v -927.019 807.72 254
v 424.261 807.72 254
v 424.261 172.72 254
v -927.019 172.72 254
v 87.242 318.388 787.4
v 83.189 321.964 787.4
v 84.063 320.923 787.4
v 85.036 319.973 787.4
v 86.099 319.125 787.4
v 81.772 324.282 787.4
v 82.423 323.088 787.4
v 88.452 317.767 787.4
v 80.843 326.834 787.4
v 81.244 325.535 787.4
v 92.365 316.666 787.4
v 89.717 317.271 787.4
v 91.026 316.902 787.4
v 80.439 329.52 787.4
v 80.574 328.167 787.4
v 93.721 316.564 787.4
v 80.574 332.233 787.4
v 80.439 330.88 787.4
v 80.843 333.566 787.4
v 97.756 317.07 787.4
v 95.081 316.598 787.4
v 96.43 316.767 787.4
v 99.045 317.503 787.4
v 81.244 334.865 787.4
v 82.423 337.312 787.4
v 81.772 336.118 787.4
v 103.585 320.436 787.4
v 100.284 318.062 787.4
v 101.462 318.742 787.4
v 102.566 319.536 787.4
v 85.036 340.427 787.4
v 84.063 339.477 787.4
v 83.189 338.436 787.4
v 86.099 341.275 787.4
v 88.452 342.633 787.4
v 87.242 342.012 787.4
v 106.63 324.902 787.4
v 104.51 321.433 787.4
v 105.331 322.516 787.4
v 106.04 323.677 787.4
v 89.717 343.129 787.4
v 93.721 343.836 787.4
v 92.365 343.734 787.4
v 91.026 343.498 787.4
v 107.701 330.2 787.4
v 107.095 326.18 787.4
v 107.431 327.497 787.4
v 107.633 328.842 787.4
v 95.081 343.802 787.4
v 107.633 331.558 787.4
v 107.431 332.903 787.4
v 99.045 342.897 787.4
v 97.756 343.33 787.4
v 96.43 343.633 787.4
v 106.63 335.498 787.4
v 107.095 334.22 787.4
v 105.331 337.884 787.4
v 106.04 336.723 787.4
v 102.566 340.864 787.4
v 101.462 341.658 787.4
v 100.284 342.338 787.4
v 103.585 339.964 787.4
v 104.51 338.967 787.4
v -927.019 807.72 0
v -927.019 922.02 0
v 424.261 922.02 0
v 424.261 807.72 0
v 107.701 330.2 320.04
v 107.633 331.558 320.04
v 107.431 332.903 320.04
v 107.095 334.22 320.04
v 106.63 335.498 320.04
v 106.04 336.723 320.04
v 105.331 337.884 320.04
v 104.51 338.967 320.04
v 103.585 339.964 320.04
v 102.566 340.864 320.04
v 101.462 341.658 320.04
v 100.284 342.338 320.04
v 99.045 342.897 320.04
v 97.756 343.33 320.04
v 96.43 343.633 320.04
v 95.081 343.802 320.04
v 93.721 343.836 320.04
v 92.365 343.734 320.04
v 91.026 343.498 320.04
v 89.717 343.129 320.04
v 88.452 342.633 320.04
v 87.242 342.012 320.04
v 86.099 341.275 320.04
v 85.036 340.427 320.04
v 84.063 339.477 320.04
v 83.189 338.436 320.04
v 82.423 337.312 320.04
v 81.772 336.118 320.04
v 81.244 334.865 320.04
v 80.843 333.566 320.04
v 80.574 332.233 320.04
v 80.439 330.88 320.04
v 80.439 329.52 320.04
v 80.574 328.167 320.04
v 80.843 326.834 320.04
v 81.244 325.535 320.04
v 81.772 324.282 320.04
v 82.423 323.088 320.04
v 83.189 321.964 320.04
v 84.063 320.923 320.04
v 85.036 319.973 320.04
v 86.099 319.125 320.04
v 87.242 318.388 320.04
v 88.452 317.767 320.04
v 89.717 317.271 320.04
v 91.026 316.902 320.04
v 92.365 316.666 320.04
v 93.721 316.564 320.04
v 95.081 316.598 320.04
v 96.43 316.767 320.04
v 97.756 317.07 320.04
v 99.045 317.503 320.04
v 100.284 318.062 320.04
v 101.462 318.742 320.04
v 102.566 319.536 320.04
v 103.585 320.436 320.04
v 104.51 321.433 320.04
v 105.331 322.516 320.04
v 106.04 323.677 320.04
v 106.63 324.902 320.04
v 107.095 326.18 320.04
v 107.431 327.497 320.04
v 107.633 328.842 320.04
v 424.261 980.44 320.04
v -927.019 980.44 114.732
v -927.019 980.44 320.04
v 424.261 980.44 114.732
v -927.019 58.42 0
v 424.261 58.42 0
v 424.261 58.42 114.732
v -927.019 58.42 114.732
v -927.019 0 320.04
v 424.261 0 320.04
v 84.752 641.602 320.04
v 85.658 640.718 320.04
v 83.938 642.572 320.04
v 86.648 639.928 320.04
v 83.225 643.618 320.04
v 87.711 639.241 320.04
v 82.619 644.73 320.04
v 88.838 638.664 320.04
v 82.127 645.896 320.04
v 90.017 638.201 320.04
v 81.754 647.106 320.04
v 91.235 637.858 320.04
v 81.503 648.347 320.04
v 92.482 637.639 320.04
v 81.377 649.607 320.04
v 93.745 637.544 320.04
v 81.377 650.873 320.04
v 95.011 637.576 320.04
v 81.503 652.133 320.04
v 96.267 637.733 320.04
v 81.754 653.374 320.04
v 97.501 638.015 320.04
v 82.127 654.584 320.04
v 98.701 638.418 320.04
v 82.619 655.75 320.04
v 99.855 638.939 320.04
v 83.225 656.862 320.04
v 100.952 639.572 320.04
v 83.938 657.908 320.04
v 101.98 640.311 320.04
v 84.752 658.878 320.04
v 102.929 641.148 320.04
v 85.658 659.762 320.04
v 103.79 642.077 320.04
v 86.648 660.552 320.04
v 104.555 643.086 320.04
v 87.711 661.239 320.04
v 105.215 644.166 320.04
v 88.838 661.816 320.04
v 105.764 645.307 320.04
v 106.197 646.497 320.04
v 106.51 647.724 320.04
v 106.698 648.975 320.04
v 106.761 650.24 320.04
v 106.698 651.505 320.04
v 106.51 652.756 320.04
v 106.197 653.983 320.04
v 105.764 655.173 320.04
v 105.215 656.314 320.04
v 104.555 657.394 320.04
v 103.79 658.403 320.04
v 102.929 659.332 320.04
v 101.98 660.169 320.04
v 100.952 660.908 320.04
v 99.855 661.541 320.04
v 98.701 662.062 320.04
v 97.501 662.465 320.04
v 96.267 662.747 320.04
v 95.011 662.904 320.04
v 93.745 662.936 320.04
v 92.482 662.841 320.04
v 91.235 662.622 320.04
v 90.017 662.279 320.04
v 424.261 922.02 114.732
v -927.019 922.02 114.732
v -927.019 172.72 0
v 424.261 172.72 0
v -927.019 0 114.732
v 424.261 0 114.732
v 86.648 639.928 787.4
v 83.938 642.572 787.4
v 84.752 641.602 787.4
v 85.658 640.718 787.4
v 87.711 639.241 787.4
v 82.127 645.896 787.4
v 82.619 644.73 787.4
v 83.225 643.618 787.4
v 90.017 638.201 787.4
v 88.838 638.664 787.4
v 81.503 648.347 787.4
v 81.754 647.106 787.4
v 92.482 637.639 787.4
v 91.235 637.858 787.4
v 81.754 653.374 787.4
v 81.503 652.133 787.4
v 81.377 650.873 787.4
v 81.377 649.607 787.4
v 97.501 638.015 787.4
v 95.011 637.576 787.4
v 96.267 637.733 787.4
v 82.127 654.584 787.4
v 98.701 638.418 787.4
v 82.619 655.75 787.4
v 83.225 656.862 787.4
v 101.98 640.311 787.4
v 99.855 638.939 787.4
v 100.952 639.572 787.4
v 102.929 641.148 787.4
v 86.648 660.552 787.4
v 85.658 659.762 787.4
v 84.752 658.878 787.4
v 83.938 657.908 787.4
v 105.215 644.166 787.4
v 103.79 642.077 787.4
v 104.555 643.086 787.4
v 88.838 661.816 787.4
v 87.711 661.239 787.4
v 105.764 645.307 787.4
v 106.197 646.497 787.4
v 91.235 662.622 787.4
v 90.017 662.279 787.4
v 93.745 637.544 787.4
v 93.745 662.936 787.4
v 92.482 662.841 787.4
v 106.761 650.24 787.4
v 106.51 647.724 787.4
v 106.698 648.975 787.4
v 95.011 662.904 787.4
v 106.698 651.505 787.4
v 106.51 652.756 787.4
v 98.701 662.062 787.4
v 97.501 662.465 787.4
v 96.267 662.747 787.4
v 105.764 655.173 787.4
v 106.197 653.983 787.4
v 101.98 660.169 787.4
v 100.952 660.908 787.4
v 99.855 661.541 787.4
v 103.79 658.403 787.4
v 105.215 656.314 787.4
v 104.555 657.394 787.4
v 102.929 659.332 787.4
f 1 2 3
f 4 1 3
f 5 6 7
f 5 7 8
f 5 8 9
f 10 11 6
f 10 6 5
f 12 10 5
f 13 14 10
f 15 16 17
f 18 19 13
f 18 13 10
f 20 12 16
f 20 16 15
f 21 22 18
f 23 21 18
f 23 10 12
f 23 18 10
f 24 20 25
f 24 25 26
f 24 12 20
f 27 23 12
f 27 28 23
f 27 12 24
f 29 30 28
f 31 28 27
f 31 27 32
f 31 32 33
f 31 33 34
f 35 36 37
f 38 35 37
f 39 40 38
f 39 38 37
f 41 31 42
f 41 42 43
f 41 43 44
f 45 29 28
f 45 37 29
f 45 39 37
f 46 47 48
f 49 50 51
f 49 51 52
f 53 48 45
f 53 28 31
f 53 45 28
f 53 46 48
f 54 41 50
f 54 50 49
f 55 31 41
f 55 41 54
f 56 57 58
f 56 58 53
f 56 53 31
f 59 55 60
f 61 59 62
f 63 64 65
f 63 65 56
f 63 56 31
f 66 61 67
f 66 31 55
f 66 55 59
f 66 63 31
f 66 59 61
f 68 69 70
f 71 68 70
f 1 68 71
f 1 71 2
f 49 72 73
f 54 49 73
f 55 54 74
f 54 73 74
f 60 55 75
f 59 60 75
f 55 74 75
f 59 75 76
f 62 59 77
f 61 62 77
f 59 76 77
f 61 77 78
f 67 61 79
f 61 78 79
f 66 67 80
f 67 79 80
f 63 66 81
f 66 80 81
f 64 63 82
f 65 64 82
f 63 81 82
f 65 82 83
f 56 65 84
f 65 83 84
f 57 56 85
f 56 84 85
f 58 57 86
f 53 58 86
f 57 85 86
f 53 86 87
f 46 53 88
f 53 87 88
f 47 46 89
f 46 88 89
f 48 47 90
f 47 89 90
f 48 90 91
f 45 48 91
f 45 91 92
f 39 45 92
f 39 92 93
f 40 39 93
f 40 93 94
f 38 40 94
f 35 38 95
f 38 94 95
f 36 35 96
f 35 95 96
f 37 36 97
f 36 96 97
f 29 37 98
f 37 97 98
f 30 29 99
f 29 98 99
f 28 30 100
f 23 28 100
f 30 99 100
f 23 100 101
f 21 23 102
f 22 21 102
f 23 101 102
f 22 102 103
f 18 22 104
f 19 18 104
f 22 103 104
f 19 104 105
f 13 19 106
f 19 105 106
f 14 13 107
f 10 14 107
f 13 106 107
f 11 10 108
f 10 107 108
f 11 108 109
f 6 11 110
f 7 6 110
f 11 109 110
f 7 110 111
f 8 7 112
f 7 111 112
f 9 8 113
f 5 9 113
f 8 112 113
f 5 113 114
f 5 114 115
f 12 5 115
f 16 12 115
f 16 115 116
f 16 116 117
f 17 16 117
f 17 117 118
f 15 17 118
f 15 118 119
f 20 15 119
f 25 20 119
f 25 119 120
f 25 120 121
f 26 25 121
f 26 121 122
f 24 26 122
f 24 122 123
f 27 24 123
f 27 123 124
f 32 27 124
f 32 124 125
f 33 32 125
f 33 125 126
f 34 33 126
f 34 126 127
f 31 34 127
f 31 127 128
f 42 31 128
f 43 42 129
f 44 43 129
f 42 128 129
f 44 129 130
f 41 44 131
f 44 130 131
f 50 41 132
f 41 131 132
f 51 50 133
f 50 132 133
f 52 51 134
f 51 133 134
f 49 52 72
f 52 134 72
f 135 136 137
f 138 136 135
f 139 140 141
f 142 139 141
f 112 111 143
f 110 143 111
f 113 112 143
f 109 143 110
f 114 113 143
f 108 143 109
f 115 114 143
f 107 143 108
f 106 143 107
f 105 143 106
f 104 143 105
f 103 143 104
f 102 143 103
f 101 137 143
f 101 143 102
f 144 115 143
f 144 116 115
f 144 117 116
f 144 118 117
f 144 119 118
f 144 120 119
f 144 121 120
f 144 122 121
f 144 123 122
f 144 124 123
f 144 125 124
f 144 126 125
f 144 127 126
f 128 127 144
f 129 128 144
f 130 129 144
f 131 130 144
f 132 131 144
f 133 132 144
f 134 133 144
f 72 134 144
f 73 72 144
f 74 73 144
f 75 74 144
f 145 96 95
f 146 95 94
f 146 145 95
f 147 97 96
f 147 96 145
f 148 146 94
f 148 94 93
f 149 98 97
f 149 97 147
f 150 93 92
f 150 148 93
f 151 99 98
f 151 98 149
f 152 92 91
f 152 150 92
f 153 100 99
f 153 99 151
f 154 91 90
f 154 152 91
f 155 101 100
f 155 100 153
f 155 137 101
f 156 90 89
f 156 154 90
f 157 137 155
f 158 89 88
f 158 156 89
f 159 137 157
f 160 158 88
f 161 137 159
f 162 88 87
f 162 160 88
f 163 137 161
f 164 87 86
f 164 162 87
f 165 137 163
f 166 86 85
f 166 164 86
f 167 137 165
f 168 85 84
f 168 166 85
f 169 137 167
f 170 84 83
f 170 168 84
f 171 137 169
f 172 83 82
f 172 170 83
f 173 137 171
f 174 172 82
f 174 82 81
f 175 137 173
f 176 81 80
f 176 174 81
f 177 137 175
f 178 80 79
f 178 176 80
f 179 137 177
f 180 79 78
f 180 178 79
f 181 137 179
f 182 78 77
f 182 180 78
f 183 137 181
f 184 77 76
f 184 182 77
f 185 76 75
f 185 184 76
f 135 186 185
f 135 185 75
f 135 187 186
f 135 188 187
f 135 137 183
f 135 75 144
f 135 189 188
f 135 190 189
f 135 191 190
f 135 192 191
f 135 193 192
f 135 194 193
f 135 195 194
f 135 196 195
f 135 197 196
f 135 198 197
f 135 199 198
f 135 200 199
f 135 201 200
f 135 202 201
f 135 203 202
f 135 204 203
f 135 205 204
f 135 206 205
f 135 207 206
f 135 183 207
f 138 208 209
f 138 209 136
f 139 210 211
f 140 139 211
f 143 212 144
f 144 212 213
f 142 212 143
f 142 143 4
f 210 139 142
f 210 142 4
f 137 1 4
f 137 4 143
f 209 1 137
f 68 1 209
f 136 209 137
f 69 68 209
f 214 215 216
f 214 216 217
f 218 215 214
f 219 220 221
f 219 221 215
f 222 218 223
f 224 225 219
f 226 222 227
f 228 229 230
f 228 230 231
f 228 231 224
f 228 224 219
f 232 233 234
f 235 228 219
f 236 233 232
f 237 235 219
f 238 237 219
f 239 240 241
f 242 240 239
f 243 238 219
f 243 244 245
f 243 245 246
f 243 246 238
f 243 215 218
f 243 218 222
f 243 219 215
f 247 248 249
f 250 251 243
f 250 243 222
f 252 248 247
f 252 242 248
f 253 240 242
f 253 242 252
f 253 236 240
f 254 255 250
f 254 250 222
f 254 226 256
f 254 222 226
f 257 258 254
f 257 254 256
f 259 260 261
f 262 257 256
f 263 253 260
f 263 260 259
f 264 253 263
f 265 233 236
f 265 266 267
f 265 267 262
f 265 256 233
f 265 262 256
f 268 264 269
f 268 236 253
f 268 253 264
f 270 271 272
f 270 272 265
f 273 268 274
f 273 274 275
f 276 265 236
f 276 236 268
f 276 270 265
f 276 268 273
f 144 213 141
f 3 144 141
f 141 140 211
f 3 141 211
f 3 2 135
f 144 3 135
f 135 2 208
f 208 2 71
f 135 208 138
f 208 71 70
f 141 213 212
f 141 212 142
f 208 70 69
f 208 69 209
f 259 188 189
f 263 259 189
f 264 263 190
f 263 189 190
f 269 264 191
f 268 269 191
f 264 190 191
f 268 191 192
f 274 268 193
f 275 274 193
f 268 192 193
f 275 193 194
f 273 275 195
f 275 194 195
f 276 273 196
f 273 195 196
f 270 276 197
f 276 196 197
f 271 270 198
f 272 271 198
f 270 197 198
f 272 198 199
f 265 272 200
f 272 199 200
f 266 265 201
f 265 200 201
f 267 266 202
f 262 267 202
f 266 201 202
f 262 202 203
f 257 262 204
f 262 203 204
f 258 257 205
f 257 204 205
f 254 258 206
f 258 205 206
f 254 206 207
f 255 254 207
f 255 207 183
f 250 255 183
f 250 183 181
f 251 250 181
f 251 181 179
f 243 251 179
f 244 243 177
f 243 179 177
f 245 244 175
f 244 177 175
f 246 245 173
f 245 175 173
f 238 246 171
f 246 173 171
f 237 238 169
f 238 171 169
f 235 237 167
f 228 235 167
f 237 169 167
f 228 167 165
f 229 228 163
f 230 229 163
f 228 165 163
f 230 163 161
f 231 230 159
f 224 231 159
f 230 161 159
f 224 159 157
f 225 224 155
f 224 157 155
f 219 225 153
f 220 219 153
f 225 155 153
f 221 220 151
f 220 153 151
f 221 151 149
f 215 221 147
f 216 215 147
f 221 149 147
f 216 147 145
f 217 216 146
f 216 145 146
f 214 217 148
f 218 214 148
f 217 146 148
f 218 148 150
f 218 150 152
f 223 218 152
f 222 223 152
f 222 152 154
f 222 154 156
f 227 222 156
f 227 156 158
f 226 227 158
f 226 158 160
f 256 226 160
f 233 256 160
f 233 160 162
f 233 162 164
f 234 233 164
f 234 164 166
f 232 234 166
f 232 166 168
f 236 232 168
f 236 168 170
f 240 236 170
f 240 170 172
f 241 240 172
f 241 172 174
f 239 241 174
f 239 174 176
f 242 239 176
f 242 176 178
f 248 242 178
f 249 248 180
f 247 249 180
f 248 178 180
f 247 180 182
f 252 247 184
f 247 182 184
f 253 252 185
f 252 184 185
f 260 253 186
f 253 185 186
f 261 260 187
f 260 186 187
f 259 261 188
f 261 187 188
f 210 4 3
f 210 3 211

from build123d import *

# Parameters (mm, degrees)
F0_W     = 1351.28
F0_H     = 980.44
F1_DEPTH = 320.04
F2_R     = 12.7
F2_R_2   = 13.639748
F3_DEPTH = 467.36
F5_DEPTH = 1351.28
F6_W     = 58.42
F6_H     = 114.732094
F7_DEPTH = 1356.36


with BuildPart() as f1:
    # F0 (on Top) → F1 (new body)
    with BuildSketch(Plane.XY):
        with Locations((-251.378548, 490.22)):
            Rectangle(F0_W, F0_H)
    extrude(amount=F1_DEPTH)

    # F2 (on face) → F3 (join)
    with BuildSketch(Plane.XY.offset(320.04)):
        with Locations((94.061452, 650.24)):
            Circle(F2_R)
        with Locations((94.061452, 330.2)):
            Circle(F2_R_2)
    extrude(amount=F3_DEPTH)

    # F4 (on face) → F5 (cut)
    with BuildSketch(Plane.YZ.offset(424.261452)):
        Polygon((807.72, 254), (490.22, 254), (172.72, 254), (172.72, 0), (490.22, 0), (807.72, 0), align=None)
    extrude(amount=-F5_DEPTH, mode=Mode.SUBTRACT)

    # F6 (on face) → F7 (cut)
    with BuildSketch(Plane.YZ.offset(424.261452)):
        with Locations((29.21, 57.366047)):
            Rectangle(F6_W, F6_H)
        with Locations((951.23, 57.366047)):
            Rectangle(F6_W, F6_H)
    extrude(amount=-F7_DEPTH, mode=Mode.SUBTRACT)


solid = f1.part
